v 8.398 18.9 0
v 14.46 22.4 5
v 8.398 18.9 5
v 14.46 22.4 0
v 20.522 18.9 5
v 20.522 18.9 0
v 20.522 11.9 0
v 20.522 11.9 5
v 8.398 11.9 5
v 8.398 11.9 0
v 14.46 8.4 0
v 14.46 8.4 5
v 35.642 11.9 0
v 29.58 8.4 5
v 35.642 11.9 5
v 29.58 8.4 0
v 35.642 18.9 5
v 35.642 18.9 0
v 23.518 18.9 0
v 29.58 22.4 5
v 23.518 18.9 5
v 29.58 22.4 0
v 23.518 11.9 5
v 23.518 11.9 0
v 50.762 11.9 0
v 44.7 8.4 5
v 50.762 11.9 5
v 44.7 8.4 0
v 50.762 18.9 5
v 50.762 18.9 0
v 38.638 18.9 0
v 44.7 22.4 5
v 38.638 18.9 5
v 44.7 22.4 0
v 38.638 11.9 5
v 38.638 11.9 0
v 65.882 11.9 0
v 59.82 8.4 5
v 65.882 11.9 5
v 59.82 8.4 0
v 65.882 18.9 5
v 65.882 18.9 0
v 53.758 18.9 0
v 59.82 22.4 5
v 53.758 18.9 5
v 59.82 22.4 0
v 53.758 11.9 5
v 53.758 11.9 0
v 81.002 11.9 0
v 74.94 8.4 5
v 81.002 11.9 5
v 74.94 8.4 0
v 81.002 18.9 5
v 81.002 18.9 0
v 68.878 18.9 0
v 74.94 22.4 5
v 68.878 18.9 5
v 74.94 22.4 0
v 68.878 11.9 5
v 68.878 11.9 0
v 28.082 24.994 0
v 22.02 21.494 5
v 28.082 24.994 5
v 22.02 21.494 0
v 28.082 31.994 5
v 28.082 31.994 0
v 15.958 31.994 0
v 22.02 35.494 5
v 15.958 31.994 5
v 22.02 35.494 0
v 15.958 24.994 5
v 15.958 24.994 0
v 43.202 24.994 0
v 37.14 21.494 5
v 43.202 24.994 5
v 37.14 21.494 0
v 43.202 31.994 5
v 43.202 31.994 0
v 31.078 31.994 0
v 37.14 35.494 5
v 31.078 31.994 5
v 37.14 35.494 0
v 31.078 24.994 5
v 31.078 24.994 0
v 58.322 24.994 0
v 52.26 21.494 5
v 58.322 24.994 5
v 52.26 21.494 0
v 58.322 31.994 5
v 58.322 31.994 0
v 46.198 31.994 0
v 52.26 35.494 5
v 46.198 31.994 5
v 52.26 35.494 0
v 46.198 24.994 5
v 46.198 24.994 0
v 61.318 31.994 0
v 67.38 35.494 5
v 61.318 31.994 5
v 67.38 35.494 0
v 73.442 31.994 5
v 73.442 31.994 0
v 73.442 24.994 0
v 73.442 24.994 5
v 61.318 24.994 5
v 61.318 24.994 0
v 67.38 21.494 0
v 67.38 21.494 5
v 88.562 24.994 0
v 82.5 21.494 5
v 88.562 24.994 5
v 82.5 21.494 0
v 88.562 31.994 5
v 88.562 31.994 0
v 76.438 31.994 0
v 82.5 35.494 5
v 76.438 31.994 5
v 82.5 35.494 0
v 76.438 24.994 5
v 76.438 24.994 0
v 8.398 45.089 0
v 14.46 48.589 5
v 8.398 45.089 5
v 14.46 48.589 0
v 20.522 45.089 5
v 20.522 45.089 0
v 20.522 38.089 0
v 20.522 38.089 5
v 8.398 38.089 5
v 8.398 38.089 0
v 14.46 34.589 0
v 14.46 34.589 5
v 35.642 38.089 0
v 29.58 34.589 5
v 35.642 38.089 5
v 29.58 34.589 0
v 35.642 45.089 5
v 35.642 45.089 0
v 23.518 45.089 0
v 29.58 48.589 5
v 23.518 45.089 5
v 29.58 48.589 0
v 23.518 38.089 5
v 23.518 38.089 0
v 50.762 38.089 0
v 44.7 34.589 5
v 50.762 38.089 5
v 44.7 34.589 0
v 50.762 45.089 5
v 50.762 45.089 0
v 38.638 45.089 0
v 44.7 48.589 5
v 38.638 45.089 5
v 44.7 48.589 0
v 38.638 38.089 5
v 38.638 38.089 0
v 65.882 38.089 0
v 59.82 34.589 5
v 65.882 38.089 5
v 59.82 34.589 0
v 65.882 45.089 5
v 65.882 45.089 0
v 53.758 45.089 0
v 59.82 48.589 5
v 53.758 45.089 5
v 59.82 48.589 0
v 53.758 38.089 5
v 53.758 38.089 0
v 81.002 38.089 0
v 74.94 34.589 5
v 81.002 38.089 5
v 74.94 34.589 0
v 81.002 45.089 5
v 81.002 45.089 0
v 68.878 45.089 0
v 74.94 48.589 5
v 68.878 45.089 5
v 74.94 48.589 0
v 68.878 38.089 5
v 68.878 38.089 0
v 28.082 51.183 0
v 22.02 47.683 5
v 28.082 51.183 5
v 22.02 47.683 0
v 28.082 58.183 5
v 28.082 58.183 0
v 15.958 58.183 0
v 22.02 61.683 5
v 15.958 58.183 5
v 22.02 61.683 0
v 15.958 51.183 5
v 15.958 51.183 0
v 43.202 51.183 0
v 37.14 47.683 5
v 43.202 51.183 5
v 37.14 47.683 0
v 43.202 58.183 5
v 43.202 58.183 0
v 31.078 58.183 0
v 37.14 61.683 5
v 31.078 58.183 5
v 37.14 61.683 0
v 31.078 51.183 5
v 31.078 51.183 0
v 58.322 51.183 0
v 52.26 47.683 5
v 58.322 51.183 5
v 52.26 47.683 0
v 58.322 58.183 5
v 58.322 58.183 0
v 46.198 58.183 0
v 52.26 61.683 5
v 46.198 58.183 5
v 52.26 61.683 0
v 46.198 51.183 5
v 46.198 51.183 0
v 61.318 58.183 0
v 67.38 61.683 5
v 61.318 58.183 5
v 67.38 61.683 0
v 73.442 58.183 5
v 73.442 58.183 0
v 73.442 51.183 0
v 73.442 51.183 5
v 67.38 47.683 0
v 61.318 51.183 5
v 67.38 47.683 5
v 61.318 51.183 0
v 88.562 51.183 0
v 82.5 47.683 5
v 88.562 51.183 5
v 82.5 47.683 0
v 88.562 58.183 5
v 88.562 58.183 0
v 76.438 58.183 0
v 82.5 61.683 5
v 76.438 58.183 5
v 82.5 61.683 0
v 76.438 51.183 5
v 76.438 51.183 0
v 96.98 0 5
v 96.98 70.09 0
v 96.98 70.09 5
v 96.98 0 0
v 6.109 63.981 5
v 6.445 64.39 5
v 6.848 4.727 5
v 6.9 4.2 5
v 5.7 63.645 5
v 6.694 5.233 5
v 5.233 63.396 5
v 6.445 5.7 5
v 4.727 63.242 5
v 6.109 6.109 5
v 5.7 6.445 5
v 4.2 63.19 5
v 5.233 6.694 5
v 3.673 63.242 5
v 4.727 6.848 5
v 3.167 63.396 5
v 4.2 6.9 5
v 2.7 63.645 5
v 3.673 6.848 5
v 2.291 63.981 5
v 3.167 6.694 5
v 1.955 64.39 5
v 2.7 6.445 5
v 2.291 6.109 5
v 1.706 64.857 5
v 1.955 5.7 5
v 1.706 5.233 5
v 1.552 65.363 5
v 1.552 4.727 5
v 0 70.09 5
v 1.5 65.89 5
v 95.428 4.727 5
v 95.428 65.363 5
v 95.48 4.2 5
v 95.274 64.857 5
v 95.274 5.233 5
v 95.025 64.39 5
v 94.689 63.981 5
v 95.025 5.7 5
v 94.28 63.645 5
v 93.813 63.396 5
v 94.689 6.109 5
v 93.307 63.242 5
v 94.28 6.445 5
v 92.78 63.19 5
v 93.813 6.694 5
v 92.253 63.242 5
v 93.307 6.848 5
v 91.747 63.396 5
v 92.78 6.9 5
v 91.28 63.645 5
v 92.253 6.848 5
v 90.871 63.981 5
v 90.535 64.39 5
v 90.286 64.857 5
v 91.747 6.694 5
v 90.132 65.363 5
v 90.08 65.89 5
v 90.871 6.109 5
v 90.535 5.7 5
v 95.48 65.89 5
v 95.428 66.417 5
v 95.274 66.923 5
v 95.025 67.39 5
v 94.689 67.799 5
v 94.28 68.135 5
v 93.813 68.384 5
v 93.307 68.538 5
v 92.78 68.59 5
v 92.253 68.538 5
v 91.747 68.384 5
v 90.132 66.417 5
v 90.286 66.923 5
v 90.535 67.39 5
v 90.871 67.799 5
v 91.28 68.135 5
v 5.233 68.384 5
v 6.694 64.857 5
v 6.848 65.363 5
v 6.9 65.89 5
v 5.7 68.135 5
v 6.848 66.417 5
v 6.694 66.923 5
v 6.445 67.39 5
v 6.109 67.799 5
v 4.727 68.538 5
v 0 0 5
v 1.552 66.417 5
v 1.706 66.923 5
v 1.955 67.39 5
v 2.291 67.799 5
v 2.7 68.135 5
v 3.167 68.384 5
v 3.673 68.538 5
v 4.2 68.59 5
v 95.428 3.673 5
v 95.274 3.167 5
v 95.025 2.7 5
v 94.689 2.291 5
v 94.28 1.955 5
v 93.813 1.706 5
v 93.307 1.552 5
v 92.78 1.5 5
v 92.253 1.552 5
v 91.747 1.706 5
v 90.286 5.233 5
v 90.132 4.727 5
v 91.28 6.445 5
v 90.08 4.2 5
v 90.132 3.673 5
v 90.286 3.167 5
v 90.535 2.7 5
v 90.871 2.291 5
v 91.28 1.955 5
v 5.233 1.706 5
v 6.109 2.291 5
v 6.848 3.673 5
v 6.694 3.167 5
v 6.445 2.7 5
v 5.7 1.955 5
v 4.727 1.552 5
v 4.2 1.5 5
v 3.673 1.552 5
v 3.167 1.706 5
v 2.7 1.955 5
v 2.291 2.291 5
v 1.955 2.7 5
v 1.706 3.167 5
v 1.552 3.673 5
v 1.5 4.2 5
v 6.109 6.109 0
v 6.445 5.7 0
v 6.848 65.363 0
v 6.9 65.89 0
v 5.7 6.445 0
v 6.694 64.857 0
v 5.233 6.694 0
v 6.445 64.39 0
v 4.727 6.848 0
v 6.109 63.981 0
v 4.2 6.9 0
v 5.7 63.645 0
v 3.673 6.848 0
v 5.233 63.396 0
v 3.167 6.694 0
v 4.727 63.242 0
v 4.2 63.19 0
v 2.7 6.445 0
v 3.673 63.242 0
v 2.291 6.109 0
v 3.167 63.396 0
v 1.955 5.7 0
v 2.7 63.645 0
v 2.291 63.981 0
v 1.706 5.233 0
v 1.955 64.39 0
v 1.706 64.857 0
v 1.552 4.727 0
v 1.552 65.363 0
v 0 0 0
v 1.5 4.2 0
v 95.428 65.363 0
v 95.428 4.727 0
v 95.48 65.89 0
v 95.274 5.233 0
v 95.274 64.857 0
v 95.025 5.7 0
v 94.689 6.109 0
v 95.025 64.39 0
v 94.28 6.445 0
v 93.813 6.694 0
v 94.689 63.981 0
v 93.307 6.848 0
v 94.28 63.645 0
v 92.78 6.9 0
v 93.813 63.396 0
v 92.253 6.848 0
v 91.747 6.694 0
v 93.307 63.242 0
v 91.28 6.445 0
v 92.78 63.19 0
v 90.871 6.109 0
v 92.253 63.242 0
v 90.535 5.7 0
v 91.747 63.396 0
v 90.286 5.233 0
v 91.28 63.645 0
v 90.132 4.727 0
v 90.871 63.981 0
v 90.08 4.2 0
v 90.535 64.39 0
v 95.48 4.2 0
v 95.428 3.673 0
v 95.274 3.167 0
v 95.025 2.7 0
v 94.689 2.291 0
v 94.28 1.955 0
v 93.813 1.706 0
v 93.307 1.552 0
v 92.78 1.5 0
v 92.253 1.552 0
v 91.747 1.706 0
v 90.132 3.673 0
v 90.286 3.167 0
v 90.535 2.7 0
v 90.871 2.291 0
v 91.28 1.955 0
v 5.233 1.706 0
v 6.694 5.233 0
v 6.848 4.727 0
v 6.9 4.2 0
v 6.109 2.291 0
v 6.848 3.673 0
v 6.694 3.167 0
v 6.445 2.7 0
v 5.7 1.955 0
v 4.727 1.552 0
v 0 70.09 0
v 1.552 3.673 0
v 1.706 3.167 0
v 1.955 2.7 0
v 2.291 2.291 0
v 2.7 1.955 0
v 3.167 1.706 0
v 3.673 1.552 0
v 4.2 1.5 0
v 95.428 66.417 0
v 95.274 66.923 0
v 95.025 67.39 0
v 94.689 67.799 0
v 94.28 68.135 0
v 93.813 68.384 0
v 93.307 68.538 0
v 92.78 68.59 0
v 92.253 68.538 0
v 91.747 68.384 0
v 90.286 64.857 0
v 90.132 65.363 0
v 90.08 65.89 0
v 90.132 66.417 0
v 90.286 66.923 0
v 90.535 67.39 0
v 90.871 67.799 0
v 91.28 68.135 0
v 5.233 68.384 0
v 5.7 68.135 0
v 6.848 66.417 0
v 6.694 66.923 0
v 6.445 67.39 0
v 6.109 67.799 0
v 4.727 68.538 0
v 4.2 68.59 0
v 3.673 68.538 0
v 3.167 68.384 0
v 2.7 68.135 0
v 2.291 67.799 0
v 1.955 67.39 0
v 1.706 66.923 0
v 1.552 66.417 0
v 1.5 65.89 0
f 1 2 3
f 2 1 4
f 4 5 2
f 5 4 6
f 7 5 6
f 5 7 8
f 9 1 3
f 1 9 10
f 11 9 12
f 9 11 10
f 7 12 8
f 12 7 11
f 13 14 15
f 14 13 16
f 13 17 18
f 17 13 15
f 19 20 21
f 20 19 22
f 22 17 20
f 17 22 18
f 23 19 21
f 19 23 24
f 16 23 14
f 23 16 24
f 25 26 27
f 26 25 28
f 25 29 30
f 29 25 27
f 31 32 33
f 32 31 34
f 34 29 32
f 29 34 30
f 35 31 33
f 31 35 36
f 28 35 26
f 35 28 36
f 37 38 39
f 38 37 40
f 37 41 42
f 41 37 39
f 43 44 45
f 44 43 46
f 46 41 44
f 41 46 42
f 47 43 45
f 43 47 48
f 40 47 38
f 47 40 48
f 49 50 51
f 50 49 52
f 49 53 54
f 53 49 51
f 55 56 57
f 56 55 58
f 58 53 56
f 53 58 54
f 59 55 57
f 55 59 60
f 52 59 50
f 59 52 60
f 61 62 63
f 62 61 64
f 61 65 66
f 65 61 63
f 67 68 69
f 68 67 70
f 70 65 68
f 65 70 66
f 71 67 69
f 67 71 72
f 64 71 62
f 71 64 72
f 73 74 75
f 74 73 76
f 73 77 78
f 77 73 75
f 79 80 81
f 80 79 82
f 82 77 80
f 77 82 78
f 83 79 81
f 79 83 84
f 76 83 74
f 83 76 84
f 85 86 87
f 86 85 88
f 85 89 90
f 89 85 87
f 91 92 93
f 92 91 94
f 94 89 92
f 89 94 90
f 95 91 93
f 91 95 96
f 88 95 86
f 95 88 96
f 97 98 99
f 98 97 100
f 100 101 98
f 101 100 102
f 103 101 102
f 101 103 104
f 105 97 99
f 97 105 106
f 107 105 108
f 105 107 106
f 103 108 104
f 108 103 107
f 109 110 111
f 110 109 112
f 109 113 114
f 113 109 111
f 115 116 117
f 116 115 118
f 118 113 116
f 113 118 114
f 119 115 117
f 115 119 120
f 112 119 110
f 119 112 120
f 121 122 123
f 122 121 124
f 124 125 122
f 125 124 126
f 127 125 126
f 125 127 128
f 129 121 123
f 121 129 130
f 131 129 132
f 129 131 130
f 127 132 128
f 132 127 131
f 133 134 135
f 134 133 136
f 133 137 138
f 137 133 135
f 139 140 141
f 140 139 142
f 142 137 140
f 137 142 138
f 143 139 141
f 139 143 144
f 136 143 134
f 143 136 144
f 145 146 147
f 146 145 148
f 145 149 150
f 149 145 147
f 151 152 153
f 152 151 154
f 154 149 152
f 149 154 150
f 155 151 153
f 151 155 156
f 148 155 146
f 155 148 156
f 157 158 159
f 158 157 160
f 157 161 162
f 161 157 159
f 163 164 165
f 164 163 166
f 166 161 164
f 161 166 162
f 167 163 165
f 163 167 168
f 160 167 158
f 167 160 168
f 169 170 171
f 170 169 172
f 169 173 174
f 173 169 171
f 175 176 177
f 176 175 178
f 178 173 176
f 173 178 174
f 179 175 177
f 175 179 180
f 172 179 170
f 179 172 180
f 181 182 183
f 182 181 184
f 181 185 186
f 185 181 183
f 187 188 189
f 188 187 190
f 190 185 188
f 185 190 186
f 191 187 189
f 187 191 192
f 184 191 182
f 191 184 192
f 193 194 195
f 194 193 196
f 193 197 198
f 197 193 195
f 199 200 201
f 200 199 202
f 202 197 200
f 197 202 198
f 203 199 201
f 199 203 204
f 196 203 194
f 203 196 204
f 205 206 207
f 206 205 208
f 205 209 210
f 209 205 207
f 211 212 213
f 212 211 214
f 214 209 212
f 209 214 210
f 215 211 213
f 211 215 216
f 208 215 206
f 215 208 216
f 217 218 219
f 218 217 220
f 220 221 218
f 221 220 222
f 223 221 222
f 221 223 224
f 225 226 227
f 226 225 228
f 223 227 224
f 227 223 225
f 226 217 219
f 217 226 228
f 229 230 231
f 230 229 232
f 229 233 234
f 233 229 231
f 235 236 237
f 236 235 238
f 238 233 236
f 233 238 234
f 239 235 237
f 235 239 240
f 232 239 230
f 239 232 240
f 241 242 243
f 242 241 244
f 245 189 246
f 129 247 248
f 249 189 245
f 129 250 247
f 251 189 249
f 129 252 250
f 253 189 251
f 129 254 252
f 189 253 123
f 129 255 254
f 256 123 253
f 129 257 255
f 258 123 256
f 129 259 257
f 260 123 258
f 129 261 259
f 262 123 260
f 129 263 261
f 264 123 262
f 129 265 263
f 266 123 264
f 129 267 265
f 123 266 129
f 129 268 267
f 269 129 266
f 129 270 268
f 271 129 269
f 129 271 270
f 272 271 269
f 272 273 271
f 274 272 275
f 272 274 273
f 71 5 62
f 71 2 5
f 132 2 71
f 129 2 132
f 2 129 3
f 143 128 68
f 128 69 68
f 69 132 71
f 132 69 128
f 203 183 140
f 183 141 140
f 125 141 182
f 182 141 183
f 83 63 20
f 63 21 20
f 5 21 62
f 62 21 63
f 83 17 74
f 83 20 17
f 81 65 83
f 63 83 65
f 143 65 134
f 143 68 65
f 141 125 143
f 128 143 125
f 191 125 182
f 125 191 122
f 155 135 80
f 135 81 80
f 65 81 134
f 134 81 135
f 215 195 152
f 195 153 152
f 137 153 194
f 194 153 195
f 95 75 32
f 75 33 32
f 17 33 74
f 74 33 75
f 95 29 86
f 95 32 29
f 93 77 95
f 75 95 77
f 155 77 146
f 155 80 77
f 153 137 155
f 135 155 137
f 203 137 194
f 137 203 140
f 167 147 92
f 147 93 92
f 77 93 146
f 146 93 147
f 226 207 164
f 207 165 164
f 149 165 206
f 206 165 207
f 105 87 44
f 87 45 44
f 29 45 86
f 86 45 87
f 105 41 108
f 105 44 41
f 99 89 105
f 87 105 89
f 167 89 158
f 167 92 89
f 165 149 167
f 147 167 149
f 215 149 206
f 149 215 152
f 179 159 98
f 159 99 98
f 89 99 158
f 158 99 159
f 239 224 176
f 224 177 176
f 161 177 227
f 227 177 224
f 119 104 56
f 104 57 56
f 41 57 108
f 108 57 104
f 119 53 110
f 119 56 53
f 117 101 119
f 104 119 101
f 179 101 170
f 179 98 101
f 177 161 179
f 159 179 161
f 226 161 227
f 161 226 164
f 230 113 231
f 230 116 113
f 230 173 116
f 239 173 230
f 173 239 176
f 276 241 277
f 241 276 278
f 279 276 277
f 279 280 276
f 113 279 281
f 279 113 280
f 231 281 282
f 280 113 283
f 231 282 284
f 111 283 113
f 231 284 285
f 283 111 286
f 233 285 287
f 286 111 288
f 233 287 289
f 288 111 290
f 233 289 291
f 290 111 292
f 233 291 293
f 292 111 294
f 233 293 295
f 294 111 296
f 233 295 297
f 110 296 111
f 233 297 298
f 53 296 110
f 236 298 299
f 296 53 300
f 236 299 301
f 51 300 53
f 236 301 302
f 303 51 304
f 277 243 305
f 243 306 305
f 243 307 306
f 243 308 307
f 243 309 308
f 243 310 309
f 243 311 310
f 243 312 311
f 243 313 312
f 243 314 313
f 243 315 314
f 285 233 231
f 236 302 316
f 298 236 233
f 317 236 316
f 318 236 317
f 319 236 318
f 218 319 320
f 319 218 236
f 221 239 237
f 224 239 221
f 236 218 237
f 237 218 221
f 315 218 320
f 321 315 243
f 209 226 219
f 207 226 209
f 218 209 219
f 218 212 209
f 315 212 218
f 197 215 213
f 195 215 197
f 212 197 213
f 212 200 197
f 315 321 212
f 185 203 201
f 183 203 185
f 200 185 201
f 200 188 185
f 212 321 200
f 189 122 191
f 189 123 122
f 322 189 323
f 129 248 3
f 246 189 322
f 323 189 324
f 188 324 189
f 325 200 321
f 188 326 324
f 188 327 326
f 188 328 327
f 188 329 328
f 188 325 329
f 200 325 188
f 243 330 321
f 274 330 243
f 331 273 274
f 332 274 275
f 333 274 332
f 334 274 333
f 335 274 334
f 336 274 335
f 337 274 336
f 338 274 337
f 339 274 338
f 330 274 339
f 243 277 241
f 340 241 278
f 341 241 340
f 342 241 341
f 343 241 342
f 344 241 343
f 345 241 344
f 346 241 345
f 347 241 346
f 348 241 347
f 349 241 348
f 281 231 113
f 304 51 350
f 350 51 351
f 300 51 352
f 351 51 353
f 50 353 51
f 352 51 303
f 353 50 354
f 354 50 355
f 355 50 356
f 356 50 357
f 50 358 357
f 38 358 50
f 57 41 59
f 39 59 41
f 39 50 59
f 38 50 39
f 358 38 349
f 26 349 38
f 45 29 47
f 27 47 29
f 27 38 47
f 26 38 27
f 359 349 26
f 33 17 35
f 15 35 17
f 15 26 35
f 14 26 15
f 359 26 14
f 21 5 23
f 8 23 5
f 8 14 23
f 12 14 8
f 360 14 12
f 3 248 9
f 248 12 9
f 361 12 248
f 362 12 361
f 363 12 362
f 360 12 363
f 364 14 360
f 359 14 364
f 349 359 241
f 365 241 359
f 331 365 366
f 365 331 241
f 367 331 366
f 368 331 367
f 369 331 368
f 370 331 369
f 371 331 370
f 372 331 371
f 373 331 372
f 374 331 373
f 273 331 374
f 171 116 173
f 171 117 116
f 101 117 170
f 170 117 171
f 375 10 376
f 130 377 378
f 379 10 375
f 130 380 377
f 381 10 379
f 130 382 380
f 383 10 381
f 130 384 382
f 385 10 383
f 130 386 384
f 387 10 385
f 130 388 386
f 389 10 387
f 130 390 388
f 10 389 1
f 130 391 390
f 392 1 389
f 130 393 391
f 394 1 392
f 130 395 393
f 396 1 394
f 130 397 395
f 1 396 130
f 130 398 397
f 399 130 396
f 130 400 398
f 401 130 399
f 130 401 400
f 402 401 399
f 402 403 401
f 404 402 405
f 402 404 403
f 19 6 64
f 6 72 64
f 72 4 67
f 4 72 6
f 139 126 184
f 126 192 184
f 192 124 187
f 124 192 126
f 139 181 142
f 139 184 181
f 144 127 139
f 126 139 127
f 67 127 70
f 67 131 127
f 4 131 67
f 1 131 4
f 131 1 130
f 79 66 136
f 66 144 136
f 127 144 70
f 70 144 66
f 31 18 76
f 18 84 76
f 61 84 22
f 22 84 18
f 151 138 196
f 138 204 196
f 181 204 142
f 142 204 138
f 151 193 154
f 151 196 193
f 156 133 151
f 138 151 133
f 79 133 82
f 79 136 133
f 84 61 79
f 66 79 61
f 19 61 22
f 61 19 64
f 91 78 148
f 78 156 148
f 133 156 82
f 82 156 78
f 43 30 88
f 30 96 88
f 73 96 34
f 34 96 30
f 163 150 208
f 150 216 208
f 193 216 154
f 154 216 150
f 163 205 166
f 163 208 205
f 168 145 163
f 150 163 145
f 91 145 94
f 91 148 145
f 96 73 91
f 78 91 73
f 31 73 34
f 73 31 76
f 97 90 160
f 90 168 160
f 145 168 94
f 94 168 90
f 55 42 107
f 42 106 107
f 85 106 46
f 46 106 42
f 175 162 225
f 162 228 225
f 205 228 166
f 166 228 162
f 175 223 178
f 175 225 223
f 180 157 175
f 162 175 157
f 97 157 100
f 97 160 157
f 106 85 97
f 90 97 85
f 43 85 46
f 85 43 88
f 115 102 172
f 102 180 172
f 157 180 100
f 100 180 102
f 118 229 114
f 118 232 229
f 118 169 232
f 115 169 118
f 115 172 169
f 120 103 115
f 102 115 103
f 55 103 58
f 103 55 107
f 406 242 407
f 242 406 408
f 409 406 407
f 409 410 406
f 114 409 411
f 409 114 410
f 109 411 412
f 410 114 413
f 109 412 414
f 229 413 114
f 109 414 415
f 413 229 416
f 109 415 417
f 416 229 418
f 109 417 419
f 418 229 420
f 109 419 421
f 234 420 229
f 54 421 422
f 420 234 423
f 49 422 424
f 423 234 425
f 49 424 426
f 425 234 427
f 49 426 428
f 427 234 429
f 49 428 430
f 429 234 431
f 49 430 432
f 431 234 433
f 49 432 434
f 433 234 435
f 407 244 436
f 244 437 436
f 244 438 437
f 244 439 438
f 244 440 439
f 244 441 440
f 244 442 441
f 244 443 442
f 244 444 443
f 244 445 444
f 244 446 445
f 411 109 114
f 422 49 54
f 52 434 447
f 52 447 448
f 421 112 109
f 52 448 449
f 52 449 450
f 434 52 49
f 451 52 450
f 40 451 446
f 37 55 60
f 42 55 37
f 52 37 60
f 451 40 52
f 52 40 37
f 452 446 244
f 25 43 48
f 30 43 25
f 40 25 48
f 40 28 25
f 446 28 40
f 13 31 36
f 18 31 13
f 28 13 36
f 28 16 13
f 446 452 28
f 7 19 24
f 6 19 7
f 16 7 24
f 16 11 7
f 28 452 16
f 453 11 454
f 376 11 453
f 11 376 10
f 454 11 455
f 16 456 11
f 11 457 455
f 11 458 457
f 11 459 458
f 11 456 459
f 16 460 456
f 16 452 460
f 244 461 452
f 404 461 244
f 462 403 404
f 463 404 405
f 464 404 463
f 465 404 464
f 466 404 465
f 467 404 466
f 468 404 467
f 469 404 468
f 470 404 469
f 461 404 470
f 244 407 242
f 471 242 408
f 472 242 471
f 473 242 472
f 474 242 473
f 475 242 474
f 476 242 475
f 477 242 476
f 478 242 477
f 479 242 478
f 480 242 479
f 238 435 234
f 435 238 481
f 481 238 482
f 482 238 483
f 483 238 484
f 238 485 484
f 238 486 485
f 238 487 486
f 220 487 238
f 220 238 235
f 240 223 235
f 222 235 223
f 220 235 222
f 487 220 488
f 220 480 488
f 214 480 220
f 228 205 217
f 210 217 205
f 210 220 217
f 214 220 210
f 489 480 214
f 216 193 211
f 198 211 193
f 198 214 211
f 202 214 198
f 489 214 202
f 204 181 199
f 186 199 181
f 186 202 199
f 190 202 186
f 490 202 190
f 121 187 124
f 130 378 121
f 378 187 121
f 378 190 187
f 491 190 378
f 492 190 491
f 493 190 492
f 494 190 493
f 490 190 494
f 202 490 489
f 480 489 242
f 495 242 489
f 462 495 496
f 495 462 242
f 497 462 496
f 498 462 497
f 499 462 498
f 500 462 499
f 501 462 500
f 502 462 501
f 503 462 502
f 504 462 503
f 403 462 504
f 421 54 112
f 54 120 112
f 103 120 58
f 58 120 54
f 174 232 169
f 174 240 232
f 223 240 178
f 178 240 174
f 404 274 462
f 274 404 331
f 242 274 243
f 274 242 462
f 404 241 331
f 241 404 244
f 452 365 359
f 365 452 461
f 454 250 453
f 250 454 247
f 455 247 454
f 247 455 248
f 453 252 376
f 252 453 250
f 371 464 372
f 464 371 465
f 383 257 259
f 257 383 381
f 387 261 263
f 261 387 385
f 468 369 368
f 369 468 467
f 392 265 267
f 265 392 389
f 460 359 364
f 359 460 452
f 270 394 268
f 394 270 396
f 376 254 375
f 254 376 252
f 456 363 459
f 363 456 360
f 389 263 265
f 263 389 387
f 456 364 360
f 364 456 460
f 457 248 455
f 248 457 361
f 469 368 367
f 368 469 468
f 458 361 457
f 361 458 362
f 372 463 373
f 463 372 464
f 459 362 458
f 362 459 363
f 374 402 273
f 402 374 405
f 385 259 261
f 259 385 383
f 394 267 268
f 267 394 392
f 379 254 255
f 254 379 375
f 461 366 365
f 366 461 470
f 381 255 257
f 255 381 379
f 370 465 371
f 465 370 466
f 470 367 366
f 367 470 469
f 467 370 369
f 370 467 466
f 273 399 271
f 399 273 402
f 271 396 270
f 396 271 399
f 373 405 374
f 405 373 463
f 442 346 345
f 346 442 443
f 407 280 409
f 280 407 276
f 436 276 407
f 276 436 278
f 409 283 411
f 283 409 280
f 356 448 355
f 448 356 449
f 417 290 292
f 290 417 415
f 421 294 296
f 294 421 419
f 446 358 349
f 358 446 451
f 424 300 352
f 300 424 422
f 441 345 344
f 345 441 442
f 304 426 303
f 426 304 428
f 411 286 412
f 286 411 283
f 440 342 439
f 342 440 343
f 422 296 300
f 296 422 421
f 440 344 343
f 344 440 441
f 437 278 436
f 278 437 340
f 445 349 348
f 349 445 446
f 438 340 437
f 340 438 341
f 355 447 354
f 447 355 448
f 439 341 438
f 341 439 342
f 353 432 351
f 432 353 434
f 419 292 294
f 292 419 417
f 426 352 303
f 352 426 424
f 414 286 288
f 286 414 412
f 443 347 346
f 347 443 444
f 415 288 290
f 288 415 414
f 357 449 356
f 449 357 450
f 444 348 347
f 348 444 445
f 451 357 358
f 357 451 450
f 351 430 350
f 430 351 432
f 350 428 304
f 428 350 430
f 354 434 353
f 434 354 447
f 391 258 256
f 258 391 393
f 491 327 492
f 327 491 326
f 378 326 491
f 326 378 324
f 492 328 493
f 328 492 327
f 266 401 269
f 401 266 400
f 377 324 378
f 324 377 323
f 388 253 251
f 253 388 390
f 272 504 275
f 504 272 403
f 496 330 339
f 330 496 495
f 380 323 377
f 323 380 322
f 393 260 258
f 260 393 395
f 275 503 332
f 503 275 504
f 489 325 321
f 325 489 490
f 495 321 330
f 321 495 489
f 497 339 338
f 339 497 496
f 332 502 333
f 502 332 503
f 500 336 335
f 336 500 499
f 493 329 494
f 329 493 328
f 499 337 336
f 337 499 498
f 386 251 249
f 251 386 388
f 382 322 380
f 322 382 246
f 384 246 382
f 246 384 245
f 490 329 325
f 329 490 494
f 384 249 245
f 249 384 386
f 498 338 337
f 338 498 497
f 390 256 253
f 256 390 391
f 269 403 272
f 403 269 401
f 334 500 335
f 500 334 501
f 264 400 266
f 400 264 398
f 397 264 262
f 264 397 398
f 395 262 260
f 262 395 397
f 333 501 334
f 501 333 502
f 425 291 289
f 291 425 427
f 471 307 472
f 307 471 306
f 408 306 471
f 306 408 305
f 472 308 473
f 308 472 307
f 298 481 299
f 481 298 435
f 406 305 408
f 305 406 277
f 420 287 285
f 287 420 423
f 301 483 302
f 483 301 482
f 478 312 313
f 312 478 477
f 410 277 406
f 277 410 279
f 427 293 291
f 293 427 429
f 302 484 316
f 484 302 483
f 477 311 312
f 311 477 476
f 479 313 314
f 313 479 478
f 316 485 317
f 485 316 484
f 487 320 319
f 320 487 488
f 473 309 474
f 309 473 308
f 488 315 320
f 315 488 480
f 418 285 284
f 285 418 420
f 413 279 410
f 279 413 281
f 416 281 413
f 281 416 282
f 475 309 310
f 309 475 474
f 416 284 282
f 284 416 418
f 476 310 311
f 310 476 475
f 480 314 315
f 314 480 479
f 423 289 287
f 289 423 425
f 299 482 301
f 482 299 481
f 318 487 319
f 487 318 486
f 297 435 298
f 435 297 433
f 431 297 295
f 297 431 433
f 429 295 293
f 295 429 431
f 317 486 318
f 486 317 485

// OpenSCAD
$fn = 32;

// ----------------------------------------------------------------------
// Honeycomb panel: 96.98 x 70.09 mm, 20 cells of 14 mm
// ----------------------------------------------------------------------

// --- parameters (mm) ---
panel_w = 96.98;          // panel width
panel_d = 70.09;          // panel depth
thick = 5;                // panel thickness
cell_r = 7;               // hex cell circumradius
pitch = 15.12;            // hex cell pitch (centre to centre)
web = 3;                  // web between the cells
columns = 5;              // columns of cells
rows = 4;                 // rows of cells
cell_count = 20;          // total cells
shift_x = 14.46;          // first cell offset in x
shift_y = 15.4;           // first cell offset in y
mount_d = 5.4;            // corner mounting holes
hole_off = 4.2;           // mounting hole offset from the corners

difference() {
  union() {
    cube([panel_w, panel_d, thick]);
  }
  /* hexagonal cells, point-up, cut right through the plate */
  for (row = [0 : rows - 1]) {
    for (col = [0 : columns - 1]) {
      translate([shift_x + col * pitch + (row % 2) * pitch / 2, shift_y + row * pitch * 0.866025, -2.5]) rotate([0, 0, 30]) cylinder(h = thick + 5, d = 2 * cell_r, $fn = 6);
    }
  }
  /* corner mounting holes, clear of the outer cell web */
  translate([4.2, 4.2, -2.5]) cylinder(h = thick + 5, d = mount_d);
  translate([92.78, 4.2, -2.5]) cylinder(h = thick + 5, d = mount_d);
  translate([4.2, 65.89, -2.5]) cylinder(h = thick + 5, d = mount_d);
  translate([92.78, 65.89, -2.5]) cylinder(h = thick + 5, d = mount_d);
}
